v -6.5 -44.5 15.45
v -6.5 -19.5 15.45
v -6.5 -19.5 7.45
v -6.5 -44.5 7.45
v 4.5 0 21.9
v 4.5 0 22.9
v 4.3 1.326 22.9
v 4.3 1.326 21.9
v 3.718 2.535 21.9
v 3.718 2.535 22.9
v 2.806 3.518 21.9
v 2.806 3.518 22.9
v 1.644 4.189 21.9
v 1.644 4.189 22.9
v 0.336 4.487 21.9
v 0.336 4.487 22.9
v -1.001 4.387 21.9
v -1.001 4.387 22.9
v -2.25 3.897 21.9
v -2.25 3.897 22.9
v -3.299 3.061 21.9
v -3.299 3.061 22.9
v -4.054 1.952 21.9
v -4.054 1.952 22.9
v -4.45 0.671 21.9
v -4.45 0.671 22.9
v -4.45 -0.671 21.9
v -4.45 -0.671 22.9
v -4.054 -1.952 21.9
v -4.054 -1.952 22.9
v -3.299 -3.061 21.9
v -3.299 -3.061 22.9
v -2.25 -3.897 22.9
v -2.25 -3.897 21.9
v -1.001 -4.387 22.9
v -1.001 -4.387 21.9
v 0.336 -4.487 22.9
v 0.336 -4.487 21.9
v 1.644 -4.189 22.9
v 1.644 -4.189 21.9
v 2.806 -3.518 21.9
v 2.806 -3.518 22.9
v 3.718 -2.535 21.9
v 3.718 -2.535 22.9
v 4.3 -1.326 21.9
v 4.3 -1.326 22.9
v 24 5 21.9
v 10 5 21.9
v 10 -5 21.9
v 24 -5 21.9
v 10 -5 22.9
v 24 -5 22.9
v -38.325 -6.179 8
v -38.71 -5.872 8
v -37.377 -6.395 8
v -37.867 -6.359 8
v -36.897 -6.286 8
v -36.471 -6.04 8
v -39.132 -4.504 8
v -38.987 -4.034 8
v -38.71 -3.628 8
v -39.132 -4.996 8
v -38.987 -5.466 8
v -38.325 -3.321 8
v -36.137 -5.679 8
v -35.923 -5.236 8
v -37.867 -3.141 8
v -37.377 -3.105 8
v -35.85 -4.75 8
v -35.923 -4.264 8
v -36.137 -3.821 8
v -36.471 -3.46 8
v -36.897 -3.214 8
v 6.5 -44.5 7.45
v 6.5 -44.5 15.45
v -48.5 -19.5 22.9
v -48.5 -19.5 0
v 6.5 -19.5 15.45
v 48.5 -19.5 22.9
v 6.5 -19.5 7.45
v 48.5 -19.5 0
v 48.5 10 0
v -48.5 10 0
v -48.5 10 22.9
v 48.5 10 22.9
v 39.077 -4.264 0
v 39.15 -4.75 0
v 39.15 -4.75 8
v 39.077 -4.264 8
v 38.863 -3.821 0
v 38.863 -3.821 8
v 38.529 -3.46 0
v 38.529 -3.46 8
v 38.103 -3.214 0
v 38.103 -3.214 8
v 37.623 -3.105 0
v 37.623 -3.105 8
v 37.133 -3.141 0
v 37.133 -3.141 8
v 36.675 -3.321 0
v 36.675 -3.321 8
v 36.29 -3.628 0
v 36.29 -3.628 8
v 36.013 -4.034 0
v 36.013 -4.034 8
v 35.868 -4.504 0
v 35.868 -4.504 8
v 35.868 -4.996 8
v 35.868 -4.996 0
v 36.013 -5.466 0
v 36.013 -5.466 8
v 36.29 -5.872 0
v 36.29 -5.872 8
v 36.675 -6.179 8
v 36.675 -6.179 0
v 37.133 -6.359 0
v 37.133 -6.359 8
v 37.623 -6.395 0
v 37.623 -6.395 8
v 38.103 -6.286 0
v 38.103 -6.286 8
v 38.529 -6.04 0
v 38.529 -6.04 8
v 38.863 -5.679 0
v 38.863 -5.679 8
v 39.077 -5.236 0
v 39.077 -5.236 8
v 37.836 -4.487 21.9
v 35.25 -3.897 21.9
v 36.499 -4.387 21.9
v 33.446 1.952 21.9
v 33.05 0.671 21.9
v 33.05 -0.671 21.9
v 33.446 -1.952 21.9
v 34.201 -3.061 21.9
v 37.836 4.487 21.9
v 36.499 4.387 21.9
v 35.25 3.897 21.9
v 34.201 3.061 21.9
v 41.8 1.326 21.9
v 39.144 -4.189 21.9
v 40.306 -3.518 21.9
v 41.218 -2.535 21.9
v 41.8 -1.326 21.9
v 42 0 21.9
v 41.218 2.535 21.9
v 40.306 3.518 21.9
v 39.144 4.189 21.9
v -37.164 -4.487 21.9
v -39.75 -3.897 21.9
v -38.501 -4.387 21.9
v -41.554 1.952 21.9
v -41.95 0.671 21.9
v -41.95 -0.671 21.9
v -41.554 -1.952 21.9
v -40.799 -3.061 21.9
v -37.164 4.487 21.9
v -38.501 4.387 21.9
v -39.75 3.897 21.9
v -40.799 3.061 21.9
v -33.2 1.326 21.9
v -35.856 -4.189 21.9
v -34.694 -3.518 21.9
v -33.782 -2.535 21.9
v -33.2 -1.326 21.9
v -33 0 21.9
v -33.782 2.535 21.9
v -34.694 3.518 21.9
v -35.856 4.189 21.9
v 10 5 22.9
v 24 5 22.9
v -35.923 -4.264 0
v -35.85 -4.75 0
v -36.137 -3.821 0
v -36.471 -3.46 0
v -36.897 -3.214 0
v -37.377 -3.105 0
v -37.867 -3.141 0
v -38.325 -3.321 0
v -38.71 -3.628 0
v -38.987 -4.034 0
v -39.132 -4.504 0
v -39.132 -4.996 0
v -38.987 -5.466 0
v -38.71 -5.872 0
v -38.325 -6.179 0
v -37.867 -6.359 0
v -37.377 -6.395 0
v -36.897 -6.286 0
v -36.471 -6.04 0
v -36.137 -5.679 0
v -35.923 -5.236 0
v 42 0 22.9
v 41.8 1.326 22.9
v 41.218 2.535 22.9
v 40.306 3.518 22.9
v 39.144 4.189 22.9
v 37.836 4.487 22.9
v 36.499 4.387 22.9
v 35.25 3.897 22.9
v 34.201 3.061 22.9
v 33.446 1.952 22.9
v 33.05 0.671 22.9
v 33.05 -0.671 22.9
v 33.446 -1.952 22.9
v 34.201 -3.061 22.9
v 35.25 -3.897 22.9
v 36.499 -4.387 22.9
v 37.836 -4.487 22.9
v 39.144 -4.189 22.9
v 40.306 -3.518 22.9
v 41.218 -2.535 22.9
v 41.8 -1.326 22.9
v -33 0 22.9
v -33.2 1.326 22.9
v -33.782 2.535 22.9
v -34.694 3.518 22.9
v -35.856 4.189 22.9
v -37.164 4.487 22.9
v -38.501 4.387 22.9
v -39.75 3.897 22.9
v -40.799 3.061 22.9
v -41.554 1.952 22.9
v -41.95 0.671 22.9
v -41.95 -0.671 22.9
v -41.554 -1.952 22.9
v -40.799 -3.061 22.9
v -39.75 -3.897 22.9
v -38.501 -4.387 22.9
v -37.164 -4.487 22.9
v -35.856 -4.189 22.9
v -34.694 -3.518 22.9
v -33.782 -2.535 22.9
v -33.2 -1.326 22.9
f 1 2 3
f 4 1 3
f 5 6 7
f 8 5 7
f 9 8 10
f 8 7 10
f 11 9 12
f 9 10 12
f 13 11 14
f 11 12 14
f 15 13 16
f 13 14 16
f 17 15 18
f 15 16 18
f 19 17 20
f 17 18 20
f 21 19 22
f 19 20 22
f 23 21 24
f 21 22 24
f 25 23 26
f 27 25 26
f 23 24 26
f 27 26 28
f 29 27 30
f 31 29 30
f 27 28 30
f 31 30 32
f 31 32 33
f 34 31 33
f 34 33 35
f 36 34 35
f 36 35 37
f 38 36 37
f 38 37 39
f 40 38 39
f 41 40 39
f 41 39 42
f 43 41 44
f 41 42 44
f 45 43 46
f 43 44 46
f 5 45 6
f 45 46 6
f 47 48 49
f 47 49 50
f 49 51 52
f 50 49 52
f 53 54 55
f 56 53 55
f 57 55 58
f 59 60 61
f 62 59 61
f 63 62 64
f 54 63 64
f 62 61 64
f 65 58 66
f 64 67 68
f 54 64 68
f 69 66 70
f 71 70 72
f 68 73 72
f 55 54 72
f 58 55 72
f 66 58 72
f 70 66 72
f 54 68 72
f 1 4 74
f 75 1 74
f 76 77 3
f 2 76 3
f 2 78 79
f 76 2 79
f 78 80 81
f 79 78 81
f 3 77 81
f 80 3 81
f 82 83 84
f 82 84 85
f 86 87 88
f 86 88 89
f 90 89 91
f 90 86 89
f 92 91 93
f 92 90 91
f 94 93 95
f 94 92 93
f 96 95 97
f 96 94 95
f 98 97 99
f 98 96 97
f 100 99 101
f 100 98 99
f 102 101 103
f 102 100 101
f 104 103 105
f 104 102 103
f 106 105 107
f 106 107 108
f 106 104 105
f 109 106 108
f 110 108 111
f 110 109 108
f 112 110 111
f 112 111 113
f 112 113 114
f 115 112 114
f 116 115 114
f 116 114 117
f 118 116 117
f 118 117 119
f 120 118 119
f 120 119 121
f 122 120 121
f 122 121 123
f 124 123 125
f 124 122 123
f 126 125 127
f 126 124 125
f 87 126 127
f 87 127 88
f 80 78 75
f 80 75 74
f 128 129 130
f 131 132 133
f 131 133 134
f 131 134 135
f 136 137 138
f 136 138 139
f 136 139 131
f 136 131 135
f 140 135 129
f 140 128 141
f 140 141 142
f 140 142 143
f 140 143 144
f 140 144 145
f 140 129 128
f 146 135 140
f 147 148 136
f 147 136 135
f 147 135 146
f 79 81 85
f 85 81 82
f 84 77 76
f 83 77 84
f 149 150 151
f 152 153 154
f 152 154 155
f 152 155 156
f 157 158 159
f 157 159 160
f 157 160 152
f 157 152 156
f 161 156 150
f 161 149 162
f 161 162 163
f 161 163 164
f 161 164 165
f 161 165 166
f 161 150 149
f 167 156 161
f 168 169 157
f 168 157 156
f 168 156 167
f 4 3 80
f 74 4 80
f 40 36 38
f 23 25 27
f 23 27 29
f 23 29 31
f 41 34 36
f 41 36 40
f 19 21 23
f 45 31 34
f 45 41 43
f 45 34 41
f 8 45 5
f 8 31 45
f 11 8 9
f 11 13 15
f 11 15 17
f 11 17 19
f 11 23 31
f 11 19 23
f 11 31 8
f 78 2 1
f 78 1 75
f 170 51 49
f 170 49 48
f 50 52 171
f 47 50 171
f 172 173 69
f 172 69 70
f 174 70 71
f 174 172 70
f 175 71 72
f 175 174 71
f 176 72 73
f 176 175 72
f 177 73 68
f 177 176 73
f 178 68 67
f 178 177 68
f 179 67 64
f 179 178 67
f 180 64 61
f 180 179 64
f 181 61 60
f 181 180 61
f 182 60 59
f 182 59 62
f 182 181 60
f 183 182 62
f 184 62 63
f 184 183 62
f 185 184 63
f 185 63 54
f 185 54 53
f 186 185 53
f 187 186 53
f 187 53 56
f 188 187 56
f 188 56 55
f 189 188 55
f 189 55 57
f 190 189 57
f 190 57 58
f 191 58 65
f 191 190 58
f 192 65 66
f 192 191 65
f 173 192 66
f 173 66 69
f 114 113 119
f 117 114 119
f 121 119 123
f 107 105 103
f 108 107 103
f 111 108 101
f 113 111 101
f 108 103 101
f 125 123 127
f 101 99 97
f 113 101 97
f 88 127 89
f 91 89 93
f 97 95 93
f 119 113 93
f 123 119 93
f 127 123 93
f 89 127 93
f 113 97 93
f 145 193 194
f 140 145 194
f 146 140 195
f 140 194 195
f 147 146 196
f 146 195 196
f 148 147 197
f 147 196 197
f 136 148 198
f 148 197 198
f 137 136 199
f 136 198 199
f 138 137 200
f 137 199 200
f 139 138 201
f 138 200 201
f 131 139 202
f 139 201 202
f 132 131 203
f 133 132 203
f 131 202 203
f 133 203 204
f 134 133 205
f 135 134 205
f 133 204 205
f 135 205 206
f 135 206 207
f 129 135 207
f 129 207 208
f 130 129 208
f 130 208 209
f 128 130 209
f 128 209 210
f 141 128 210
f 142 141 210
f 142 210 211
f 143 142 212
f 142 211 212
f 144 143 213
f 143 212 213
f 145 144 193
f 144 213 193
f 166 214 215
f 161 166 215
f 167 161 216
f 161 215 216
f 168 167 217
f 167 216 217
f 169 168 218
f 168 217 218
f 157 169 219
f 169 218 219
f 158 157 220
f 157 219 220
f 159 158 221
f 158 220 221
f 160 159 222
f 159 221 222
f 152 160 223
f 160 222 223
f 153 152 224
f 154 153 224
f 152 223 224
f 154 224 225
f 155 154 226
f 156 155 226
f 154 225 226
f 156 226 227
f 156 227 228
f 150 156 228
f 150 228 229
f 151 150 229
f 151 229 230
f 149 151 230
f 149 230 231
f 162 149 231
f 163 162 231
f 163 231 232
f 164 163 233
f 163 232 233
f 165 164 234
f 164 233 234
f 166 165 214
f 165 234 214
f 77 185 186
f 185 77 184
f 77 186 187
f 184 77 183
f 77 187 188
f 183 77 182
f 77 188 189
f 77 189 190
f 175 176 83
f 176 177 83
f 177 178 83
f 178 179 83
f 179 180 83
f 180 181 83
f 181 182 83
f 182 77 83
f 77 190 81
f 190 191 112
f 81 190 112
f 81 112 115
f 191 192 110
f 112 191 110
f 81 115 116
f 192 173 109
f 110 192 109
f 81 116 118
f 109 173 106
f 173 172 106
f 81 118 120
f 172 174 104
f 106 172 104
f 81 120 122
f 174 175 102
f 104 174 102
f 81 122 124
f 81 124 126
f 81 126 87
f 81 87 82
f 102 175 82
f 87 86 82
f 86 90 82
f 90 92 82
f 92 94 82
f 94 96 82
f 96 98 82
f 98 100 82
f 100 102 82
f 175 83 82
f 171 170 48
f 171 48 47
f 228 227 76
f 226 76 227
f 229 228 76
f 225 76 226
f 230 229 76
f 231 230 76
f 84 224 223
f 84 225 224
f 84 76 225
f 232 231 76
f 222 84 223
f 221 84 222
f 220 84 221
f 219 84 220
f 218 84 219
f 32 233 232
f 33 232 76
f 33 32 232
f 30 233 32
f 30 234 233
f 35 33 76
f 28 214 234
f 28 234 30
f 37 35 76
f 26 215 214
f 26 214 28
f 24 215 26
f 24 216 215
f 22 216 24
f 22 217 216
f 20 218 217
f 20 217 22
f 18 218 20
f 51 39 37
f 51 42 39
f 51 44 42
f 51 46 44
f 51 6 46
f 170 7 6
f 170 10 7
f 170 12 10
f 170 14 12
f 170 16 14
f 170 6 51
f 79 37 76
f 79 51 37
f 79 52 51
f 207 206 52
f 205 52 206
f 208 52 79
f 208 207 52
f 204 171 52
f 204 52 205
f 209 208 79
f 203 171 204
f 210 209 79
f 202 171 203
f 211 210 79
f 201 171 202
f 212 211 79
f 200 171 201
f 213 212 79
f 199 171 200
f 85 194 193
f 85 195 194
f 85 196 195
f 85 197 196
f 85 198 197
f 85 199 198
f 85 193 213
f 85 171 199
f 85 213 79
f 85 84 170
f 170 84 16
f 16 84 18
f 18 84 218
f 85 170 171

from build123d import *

# Parameters (mm, degrees)
SK_BODY_W              = 97
SK_BODY_H              = 29.5
EX_BODY_DEPTH          = 22.9
SK_VESA_2XM4_R         = 1.65
CUT_VESA_2XM4_DEPTH    = 8
SK_LENSES_R            = 4.5
SK_LENSES_W            = 14
SK_LENSES_H            = 10
CUT_LENSES_DEPTH       = 1
SK_KEEPOUT_USB_C_W     = 13
SK_KEEPOUT_USB_C_H     = 8
EX_KEEPOUT_USB_C_DEPTH = 25


with BuildPart() as part:
    # SK_Body → EX_Body (new body)
    with BuildSketch(Plane.XY):
        with Locations((0, -4.75)):
            Rectangle(SK_BODY_W, SK_BODY_H)
    extrude(amount=EX_BODY_DEPTH)

    # SK_VESA_2xM4 → CUT_VESA_2xM4 (cut)
    with BuildSketch(Plane.XY):
        with Locations((37.5, -4.75)):
            Circle(SK_VESA_2XM4_R)
        with Locations((-37.5, -4.75)):
            Circle(SK_VESA_2XM4_R)
    extrude(amount=CUT_VESA_2XM4_DEPTH, mode=Mode.SUBTRACT)

    # SK_Lenses → CUT_Lenses (cut)
    with BuildSketch(Plane.XY.offset(22.9)):
        with Locations((37.5, 0)):
            Circle(SK_LENSES_R)
        with Locations((-37.5, 0)):
            Circle(SK_LENSES_R)
        Circle(SK_LENSES_R)
        with Locations((17, 0)):
            Rectangle(SK_LENSES_W, SK_LENSES_H)
    extrude(amount=-CUT_LENSES_DEPTH, mode=Mode.SUBTRACT)

    # SK_KeepOut_USB_C → EX_KeepOut_USB_C (add)
    with BuildSketch(Plane(origin=(0, -19.5, 0), x_dir=(1, 0, 0), z_dir=(0, 1, 0))):
        with Locations((0, -11.45)):
            Rectangle(SK_KEEPOUT_USB_C_W, SK_KEEPOUT_USB_C_H)
    extrude(amount=-EX_KEEPOUT_USB_C_DEPTH)


solid = part.part
